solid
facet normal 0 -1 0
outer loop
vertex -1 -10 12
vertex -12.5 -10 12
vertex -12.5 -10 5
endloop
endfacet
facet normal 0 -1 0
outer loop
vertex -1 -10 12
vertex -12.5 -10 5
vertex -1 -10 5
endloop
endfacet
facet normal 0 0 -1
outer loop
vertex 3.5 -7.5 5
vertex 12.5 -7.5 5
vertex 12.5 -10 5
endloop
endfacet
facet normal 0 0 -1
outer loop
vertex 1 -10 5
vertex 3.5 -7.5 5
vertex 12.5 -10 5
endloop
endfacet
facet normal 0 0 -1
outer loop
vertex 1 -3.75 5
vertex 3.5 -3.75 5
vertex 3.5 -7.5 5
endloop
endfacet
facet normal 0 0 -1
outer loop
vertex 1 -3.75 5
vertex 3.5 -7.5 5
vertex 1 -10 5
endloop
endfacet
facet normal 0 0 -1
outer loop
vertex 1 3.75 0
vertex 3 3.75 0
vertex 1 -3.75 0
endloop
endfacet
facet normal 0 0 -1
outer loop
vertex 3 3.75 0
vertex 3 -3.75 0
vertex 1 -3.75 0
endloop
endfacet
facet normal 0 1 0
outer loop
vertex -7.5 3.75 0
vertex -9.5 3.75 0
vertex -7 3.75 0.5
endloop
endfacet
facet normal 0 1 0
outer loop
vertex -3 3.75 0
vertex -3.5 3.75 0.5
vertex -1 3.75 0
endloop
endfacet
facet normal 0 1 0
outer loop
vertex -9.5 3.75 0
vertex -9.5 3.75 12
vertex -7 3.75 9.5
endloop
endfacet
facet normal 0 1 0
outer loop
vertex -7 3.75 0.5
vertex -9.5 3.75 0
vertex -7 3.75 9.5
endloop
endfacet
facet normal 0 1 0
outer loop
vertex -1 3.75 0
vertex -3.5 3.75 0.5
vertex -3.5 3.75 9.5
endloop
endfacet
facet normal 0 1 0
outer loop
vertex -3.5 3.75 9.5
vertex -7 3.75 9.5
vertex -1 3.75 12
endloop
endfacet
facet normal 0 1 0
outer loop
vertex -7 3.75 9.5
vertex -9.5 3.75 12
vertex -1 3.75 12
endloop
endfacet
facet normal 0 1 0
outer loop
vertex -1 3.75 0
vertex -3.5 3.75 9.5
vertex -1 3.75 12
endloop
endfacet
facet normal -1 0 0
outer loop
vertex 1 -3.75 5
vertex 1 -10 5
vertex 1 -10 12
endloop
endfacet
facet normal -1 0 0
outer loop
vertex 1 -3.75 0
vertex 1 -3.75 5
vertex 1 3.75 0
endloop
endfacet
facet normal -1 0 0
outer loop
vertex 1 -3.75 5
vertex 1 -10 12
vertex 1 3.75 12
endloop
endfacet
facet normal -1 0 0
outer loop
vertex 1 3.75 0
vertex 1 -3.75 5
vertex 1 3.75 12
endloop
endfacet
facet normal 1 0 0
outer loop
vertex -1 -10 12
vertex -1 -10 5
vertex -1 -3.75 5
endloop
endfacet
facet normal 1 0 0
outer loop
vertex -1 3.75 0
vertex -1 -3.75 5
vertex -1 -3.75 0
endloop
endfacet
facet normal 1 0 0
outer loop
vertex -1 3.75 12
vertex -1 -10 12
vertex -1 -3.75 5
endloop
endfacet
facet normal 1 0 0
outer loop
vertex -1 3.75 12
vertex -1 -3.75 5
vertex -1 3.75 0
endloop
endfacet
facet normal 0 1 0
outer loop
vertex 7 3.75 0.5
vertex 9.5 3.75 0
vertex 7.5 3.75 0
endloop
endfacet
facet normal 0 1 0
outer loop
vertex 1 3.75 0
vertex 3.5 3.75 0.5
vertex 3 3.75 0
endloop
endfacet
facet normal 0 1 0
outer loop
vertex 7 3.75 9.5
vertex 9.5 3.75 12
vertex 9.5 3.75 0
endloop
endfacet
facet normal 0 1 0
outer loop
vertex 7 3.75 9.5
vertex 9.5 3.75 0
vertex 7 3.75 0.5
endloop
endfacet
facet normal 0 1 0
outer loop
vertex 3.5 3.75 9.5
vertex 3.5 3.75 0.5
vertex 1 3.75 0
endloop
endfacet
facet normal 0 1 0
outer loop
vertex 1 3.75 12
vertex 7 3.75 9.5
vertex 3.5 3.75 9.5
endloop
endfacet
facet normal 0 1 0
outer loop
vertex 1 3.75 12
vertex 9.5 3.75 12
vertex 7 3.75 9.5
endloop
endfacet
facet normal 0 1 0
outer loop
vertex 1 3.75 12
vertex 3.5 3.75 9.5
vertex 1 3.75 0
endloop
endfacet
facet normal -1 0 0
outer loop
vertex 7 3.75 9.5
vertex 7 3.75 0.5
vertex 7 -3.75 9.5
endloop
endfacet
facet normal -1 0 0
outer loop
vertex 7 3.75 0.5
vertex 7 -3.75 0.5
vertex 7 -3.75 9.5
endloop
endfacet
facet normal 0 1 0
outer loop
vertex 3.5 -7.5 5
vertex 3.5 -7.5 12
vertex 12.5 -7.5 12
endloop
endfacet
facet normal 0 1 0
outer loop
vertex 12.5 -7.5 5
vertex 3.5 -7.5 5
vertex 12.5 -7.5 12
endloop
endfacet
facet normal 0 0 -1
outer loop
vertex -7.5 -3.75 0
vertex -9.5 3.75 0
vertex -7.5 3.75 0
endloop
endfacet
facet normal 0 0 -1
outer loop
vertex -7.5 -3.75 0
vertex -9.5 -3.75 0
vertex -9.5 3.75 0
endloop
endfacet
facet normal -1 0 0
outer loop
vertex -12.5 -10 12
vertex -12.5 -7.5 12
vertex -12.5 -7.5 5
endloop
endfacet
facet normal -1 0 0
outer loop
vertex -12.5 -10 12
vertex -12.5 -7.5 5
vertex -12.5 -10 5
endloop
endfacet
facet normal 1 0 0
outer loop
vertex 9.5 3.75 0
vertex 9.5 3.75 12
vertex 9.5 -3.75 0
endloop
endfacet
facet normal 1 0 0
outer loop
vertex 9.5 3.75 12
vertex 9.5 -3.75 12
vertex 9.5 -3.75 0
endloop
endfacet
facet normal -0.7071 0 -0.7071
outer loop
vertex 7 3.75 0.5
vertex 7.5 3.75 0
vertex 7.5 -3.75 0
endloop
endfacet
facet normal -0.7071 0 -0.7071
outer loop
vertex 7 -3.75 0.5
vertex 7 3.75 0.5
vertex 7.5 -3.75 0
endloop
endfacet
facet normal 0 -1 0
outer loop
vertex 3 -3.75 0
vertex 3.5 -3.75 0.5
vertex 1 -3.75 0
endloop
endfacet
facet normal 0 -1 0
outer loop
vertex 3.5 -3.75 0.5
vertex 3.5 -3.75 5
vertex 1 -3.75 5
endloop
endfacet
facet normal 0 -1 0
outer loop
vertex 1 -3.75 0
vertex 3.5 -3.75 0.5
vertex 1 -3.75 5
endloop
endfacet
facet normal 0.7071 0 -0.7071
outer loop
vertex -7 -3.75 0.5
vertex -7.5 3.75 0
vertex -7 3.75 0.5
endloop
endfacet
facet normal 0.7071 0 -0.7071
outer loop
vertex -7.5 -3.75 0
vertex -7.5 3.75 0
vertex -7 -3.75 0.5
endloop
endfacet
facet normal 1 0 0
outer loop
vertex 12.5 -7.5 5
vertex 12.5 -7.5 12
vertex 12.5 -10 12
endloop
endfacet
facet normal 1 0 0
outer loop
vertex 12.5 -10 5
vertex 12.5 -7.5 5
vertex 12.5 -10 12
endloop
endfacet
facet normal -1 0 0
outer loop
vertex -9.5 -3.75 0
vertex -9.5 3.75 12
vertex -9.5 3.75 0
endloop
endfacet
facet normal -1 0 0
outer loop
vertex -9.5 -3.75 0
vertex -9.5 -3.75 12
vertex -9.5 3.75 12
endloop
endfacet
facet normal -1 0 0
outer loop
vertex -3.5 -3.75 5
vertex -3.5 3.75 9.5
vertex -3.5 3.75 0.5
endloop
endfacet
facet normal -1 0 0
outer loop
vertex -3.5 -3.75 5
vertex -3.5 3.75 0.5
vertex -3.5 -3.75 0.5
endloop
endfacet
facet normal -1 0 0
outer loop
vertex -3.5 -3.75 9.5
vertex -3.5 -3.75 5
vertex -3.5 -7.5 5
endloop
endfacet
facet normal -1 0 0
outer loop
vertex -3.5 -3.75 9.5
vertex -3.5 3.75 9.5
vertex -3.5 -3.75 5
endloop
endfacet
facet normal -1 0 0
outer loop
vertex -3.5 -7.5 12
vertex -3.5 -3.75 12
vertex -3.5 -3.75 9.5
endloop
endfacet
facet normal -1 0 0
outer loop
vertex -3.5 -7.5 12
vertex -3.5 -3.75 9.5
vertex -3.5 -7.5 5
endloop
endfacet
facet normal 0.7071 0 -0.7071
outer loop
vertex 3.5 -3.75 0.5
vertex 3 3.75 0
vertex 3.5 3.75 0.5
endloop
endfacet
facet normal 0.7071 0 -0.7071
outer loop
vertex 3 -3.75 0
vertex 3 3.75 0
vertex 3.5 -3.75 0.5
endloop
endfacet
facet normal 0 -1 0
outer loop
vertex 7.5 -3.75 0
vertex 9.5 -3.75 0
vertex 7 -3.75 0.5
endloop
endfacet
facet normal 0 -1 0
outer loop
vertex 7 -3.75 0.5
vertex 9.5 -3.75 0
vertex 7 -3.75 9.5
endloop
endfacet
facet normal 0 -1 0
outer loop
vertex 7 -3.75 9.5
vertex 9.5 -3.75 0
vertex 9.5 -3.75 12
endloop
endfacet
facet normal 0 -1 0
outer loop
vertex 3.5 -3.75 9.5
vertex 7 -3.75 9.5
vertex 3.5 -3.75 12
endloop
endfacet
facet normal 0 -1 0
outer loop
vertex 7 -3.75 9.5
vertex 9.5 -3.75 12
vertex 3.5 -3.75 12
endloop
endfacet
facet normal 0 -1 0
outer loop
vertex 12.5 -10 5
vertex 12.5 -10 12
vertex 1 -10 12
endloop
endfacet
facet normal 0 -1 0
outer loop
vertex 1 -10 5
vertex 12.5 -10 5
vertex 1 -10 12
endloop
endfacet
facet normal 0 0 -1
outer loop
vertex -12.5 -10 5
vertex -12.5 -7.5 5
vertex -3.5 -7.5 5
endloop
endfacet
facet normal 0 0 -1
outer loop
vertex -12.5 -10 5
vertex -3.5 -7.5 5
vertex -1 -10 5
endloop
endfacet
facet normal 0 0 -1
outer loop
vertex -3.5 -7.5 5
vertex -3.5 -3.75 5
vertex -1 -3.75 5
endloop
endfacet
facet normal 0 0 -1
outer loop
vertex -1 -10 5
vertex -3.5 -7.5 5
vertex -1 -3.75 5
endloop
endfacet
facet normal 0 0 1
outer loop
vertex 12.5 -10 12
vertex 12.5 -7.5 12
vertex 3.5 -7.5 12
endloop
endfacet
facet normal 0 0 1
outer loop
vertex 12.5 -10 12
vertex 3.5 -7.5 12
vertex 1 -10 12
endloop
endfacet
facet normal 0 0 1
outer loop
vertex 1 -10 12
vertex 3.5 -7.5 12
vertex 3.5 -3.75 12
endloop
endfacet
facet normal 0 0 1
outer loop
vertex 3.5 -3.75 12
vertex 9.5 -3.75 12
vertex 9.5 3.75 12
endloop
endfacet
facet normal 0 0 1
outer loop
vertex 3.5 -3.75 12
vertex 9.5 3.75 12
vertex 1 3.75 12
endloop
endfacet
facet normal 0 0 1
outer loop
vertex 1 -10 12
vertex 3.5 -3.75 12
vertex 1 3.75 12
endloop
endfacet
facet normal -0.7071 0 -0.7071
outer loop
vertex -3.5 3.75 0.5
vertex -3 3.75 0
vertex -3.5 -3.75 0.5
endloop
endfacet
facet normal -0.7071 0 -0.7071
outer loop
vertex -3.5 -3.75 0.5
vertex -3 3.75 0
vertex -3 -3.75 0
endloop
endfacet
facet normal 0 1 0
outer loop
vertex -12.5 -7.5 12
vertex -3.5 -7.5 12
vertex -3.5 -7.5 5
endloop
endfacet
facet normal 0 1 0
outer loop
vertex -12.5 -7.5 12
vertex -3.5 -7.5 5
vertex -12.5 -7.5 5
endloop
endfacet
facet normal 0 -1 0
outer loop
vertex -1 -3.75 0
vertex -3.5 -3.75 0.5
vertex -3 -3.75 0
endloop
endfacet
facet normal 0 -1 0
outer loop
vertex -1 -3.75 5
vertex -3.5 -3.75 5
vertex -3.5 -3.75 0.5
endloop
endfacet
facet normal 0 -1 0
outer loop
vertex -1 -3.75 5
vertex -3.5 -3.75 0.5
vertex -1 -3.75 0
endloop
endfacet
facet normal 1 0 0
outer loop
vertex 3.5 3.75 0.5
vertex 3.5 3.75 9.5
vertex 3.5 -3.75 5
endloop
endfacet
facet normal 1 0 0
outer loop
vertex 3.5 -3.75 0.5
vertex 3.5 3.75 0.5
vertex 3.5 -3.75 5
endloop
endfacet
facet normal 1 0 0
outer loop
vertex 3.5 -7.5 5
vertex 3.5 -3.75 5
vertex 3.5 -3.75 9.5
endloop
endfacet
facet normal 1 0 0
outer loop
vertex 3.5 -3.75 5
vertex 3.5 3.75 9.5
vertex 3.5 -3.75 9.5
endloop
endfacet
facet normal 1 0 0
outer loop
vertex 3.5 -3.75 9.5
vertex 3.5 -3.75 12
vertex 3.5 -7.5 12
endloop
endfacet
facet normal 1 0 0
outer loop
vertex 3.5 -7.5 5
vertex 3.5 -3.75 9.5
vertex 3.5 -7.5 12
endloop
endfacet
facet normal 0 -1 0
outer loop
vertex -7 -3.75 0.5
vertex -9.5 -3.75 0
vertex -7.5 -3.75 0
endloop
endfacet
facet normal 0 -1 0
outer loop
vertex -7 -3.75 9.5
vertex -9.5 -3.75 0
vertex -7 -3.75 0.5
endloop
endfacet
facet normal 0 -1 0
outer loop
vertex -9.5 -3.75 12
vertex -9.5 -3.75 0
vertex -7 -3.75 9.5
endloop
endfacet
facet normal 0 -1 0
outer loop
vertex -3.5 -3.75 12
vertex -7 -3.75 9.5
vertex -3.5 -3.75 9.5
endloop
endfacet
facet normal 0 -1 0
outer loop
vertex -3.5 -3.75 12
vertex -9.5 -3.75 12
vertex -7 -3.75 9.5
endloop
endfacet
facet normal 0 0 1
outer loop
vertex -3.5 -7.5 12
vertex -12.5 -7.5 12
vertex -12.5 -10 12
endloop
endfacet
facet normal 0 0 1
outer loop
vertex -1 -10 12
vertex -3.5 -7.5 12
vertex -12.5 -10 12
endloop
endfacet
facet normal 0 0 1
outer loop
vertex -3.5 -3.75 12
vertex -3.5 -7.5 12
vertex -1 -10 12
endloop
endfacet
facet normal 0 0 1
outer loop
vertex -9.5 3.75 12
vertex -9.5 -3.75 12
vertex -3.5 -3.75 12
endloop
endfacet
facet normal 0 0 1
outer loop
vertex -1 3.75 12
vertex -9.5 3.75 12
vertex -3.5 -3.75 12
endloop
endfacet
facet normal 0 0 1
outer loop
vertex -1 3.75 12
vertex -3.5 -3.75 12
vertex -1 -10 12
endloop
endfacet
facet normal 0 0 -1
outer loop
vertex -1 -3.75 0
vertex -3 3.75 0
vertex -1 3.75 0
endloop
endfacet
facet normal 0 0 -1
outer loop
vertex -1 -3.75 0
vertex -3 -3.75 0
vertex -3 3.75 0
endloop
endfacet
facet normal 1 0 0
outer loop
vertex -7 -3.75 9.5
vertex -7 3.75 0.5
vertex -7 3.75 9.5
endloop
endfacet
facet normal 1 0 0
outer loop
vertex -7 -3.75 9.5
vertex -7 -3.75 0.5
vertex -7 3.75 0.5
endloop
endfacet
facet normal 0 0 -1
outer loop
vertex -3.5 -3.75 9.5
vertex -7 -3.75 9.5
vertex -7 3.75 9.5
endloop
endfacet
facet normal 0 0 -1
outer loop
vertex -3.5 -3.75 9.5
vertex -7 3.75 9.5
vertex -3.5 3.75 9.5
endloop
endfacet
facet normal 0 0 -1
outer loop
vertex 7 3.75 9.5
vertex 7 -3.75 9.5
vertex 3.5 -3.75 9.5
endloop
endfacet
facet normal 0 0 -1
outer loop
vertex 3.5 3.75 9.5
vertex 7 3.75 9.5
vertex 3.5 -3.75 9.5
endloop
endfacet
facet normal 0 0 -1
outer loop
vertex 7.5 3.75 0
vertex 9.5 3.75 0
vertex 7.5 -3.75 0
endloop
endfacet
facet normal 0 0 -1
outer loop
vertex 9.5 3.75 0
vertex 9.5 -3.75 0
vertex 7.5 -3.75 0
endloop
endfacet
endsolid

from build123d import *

# Parameters (mm, degrees)
F1_DEPTH = 3.75
F3_DEPTH = 7
F4_SIZE  = 0.5


with BuildPart() as f1:
    # F0 (on Front) → F1 (new body, symmetric)
    with BuildSketch(Plane.XZ):
        Polygon((-9.5, 0), (-7, 0), (-7, 9.5), (-3.5, 9.5), (-3.5, 0), (-1, 0), (-1, 12), (-9.5, 12), align=None)
    extrude(amount=F1_DEPTH, both=True)

    # F2 (on face) → F3 (join, through all)
    with BuildSketch(Plane.XY.offset(12)):
        Polygon((-1, -10), (-1, -3.75), (-3.5, -3.75), (-3.5, -7.5), (-12.5, -7.5), (-12.5, -10), align=None)
    extrude(amount=-F3_DEPTH)

    # F4
    f4_edges = [f1.edges().sort_by_distance(p)[0] for p in [
        (-3.5, 0, 0),
        (-7, 0, 0),
    ]]
    chamfer(f4_edges, length=F4_SIZE)


with BuildPart() as f5_1:
    # F5: instance of F1
    add(f1.part.mirror(Plane.YZ))


solid = Compound([f1.part, f5_1.part])
